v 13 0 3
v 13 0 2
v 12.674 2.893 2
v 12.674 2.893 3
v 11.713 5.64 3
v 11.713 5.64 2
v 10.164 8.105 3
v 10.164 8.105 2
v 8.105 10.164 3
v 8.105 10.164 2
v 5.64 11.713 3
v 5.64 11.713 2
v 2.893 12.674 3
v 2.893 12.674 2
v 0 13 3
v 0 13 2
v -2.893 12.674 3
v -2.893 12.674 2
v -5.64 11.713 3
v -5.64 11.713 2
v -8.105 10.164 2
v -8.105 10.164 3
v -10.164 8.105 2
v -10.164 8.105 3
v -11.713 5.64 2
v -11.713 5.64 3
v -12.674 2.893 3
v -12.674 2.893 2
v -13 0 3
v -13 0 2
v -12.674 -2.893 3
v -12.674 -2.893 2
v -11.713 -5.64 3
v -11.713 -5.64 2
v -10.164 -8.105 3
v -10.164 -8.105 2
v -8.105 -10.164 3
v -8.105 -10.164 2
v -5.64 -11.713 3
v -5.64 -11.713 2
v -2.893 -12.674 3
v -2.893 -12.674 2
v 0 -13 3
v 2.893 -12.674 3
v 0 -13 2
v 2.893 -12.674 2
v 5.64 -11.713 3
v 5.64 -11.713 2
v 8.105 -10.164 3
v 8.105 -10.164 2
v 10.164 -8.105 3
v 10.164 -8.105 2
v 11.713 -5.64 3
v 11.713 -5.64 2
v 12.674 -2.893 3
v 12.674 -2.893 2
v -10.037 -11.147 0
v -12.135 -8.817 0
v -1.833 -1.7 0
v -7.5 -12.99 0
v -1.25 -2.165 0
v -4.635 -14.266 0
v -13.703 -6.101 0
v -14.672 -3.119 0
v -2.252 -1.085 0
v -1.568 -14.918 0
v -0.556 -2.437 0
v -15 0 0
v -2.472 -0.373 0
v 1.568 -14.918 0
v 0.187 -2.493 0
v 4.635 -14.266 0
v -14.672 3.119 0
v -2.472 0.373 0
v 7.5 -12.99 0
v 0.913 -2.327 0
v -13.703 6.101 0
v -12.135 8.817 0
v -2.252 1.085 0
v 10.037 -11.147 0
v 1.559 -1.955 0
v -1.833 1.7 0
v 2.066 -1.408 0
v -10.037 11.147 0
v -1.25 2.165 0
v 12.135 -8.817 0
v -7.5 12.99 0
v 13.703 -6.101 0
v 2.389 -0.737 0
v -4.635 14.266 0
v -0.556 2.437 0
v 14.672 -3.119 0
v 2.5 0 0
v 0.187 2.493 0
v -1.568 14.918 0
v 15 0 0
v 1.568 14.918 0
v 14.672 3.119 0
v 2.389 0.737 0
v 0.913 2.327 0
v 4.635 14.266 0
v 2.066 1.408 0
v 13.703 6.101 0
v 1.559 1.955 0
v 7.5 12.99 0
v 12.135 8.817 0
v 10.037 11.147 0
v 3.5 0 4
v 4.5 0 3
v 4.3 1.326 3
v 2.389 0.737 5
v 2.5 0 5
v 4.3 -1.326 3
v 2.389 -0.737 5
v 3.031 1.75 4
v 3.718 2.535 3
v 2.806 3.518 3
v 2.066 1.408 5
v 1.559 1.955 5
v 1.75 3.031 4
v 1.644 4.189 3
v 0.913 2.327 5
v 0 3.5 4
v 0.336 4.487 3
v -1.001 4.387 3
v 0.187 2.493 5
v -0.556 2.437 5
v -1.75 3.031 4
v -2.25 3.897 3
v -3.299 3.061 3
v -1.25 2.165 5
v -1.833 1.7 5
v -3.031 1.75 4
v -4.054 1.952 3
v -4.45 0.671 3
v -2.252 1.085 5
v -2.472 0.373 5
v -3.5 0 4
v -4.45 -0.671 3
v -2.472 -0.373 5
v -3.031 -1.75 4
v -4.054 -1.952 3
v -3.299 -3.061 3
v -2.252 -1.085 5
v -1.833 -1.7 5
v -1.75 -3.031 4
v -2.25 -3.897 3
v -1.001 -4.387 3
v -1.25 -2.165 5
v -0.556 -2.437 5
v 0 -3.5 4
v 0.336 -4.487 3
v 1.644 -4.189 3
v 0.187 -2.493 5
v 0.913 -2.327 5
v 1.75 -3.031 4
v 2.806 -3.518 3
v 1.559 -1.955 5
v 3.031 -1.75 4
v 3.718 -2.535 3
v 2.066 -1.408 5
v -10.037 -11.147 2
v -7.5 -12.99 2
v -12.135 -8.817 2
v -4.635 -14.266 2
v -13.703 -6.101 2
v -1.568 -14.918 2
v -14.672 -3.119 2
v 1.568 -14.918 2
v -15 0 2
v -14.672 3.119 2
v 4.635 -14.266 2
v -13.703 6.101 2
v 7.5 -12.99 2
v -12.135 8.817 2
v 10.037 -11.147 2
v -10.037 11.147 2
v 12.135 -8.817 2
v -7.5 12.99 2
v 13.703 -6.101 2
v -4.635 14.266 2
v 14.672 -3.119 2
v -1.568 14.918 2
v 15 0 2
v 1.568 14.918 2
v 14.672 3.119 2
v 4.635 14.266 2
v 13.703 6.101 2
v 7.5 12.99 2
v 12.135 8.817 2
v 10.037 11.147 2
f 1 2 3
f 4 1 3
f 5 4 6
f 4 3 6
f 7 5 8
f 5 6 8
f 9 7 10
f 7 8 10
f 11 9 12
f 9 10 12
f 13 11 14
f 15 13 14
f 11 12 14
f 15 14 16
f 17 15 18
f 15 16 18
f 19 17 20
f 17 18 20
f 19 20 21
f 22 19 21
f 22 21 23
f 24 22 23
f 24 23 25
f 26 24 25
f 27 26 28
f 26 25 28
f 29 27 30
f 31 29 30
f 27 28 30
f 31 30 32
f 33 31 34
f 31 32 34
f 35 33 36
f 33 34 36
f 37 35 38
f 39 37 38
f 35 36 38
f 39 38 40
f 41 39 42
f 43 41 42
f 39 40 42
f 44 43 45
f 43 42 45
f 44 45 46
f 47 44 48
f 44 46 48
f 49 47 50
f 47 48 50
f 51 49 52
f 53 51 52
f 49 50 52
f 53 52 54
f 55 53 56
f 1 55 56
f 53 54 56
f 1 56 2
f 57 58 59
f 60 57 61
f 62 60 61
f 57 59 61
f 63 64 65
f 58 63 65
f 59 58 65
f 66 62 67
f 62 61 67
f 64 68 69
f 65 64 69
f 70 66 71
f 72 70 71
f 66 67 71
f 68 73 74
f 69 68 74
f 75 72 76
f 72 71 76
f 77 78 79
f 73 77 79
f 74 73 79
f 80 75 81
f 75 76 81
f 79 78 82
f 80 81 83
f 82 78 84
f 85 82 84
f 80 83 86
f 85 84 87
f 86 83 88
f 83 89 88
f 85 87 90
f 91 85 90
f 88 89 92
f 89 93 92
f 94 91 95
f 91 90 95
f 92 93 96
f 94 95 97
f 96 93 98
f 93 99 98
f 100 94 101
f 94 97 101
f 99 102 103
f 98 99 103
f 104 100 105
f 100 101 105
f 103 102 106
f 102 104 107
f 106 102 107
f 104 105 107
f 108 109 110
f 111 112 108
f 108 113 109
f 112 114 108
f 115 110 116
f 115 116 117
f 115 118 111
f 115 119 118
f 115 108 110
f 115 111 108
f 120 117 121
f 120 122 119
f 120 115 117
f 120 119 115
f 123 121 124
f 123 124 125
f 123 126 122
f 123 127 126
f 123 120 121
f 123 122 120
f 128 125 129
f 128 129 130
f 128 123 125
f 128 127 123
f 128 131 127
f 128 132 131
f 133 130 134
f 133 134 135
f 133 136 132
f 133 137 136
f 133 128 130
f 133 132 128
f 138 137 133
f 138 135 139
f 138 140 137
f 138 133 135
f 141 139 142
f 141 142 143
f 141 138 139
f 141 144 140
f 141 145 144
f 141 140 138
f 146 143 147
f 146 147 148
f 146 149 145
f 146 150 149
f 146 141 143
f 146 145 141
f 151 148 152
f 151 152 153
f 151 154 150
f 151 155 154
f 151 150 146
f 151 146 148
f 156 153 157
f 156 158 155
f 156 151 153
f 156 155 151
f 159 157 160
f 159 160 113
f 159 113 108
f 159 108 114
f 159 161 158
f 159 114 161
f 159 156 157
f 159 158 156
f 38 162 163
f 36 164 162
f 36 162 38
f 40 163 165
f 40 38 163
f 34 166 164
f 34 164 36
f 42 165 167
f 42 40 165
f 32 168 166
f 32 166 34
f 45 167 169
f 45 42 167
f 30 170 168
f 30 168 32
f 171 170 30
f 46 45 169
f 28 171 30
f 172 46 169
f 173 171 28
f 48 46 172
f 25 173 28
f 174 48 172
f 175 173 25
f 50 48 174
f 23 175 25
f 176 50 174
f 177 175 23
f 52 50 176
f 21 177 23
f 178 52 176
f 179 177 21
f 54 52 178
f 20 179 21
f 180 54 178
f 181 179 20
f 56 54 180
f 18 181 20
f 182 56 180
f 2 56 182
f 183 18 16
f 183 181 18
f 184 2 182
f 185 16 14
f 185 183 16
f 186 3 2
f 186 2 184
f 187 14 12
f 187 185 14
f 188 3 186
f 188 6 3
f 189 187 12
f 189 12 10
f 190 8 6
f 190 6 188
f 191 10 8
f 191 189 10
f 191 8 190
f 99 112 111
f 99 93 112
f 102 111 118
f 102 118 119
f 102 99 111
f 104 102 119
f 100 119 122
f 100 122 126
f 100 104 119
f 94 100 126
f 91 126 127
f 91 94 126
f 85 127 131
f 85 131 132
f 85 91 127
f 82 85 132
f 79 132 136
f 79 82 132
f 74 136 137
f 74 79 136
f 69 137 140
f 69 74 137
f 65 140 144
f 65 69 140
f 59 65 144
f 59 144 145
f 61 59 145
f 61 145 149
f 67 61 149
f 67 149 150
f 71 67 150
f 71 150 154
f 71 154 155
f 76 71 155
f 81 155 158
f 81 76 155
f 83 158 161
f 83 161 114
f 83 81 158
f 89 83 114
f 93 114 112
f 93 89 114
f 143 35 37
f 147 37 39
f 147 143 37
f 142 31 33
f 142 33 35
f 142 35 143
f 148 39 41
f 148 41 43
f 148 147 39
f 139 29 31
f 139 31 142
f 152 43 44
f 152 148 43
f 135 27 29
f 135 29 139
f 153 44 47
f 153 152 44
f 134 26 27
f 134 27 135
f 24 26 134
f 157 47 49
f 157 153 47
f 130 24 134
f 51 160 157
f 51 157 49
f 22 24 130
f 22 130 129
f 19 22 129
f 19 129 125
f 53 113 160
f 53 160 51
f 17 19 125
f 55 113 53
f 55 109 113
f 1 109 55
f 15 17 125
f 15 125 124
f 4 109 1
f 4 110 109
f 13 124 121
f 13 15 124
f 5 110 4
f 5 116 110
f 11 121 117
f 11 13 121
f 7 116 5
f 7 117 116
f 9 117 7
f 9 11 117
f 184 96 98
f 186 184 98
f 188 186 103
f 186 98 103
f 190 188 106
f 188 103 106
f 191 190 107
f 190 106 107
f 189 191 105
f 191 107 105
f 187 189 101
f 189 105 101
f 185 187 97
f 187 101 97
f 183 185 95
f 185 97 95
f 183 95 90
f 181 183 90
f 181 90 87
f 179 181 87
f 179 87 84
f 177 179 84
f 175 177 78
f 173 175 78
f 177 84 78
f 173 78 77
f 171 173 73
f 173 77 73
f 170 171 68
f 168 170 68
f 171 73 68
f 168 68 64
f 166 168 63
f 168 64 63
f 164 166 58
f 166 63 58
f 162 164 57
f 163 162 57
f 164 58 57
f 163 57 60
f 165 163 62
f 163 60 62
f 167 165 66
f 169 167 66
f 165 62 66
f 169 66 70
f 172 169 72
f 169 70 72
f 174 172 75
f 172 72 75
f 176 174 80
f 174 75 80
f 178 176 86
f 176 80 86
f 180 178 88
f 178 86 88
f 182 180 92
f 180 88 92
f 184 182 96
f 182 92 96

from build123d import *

# Parameters (mm, degrees)
F0_R     = 15
F0_R_2   = 2.5
F1_DEPTH = 2
F2_R     = 13
F2_R_2   = 2.5
F3_DEPTH = 1
F4_R     = 4.5
F4_R_2   = 2.5
F5_DEPTH = 2
F6_SIZE2 = 1.99999
F6_SIZE  = 1.99999


# Not quite as in the source:
# - a fillet or chamfer is up to 0.001 mm smaller than in the source, because OpenCascade refuses the exact size


with BuildPart() as f1:
    # F0 (on Top) → F1 (new body)
    with BuildSketch(Plane.XY):
        Circle(F0_R)
        Circle(F0_R_2, mode=Mode.SUBTRACT)
    extrude(amount=F1_DEPTH)

    # F2 (on face) → F3 (join)
    with BuildSketch(Plane.XY.offset(2)):
        Circle(F2_R)
        Circle(F2_R_2, mode=Mode.SUBTRACT)
    extrude(amount=F3_DEPTH)

    # F4 (on face) → F5 (join)
    with BuildSketch(Plane.XY.offset(3)):
        Circle(F4_R)
        Circle(F4_R_2, mode=Mode.SUBTRACT)
    extrude(amount=F5_DEPTH)

    # F6 (size 2 and 2 in the source; OpenCascade refuses exactly that, so slightly less here)
    f6_edges = [f1.edges().sort_by_distance(p)[0] for p in [
        (-4.5, 0, 5),
    ]]
    chamfer(f6_edges, length=F6_SIZE, length2=F6_SIZE2)


solid = f1.part
